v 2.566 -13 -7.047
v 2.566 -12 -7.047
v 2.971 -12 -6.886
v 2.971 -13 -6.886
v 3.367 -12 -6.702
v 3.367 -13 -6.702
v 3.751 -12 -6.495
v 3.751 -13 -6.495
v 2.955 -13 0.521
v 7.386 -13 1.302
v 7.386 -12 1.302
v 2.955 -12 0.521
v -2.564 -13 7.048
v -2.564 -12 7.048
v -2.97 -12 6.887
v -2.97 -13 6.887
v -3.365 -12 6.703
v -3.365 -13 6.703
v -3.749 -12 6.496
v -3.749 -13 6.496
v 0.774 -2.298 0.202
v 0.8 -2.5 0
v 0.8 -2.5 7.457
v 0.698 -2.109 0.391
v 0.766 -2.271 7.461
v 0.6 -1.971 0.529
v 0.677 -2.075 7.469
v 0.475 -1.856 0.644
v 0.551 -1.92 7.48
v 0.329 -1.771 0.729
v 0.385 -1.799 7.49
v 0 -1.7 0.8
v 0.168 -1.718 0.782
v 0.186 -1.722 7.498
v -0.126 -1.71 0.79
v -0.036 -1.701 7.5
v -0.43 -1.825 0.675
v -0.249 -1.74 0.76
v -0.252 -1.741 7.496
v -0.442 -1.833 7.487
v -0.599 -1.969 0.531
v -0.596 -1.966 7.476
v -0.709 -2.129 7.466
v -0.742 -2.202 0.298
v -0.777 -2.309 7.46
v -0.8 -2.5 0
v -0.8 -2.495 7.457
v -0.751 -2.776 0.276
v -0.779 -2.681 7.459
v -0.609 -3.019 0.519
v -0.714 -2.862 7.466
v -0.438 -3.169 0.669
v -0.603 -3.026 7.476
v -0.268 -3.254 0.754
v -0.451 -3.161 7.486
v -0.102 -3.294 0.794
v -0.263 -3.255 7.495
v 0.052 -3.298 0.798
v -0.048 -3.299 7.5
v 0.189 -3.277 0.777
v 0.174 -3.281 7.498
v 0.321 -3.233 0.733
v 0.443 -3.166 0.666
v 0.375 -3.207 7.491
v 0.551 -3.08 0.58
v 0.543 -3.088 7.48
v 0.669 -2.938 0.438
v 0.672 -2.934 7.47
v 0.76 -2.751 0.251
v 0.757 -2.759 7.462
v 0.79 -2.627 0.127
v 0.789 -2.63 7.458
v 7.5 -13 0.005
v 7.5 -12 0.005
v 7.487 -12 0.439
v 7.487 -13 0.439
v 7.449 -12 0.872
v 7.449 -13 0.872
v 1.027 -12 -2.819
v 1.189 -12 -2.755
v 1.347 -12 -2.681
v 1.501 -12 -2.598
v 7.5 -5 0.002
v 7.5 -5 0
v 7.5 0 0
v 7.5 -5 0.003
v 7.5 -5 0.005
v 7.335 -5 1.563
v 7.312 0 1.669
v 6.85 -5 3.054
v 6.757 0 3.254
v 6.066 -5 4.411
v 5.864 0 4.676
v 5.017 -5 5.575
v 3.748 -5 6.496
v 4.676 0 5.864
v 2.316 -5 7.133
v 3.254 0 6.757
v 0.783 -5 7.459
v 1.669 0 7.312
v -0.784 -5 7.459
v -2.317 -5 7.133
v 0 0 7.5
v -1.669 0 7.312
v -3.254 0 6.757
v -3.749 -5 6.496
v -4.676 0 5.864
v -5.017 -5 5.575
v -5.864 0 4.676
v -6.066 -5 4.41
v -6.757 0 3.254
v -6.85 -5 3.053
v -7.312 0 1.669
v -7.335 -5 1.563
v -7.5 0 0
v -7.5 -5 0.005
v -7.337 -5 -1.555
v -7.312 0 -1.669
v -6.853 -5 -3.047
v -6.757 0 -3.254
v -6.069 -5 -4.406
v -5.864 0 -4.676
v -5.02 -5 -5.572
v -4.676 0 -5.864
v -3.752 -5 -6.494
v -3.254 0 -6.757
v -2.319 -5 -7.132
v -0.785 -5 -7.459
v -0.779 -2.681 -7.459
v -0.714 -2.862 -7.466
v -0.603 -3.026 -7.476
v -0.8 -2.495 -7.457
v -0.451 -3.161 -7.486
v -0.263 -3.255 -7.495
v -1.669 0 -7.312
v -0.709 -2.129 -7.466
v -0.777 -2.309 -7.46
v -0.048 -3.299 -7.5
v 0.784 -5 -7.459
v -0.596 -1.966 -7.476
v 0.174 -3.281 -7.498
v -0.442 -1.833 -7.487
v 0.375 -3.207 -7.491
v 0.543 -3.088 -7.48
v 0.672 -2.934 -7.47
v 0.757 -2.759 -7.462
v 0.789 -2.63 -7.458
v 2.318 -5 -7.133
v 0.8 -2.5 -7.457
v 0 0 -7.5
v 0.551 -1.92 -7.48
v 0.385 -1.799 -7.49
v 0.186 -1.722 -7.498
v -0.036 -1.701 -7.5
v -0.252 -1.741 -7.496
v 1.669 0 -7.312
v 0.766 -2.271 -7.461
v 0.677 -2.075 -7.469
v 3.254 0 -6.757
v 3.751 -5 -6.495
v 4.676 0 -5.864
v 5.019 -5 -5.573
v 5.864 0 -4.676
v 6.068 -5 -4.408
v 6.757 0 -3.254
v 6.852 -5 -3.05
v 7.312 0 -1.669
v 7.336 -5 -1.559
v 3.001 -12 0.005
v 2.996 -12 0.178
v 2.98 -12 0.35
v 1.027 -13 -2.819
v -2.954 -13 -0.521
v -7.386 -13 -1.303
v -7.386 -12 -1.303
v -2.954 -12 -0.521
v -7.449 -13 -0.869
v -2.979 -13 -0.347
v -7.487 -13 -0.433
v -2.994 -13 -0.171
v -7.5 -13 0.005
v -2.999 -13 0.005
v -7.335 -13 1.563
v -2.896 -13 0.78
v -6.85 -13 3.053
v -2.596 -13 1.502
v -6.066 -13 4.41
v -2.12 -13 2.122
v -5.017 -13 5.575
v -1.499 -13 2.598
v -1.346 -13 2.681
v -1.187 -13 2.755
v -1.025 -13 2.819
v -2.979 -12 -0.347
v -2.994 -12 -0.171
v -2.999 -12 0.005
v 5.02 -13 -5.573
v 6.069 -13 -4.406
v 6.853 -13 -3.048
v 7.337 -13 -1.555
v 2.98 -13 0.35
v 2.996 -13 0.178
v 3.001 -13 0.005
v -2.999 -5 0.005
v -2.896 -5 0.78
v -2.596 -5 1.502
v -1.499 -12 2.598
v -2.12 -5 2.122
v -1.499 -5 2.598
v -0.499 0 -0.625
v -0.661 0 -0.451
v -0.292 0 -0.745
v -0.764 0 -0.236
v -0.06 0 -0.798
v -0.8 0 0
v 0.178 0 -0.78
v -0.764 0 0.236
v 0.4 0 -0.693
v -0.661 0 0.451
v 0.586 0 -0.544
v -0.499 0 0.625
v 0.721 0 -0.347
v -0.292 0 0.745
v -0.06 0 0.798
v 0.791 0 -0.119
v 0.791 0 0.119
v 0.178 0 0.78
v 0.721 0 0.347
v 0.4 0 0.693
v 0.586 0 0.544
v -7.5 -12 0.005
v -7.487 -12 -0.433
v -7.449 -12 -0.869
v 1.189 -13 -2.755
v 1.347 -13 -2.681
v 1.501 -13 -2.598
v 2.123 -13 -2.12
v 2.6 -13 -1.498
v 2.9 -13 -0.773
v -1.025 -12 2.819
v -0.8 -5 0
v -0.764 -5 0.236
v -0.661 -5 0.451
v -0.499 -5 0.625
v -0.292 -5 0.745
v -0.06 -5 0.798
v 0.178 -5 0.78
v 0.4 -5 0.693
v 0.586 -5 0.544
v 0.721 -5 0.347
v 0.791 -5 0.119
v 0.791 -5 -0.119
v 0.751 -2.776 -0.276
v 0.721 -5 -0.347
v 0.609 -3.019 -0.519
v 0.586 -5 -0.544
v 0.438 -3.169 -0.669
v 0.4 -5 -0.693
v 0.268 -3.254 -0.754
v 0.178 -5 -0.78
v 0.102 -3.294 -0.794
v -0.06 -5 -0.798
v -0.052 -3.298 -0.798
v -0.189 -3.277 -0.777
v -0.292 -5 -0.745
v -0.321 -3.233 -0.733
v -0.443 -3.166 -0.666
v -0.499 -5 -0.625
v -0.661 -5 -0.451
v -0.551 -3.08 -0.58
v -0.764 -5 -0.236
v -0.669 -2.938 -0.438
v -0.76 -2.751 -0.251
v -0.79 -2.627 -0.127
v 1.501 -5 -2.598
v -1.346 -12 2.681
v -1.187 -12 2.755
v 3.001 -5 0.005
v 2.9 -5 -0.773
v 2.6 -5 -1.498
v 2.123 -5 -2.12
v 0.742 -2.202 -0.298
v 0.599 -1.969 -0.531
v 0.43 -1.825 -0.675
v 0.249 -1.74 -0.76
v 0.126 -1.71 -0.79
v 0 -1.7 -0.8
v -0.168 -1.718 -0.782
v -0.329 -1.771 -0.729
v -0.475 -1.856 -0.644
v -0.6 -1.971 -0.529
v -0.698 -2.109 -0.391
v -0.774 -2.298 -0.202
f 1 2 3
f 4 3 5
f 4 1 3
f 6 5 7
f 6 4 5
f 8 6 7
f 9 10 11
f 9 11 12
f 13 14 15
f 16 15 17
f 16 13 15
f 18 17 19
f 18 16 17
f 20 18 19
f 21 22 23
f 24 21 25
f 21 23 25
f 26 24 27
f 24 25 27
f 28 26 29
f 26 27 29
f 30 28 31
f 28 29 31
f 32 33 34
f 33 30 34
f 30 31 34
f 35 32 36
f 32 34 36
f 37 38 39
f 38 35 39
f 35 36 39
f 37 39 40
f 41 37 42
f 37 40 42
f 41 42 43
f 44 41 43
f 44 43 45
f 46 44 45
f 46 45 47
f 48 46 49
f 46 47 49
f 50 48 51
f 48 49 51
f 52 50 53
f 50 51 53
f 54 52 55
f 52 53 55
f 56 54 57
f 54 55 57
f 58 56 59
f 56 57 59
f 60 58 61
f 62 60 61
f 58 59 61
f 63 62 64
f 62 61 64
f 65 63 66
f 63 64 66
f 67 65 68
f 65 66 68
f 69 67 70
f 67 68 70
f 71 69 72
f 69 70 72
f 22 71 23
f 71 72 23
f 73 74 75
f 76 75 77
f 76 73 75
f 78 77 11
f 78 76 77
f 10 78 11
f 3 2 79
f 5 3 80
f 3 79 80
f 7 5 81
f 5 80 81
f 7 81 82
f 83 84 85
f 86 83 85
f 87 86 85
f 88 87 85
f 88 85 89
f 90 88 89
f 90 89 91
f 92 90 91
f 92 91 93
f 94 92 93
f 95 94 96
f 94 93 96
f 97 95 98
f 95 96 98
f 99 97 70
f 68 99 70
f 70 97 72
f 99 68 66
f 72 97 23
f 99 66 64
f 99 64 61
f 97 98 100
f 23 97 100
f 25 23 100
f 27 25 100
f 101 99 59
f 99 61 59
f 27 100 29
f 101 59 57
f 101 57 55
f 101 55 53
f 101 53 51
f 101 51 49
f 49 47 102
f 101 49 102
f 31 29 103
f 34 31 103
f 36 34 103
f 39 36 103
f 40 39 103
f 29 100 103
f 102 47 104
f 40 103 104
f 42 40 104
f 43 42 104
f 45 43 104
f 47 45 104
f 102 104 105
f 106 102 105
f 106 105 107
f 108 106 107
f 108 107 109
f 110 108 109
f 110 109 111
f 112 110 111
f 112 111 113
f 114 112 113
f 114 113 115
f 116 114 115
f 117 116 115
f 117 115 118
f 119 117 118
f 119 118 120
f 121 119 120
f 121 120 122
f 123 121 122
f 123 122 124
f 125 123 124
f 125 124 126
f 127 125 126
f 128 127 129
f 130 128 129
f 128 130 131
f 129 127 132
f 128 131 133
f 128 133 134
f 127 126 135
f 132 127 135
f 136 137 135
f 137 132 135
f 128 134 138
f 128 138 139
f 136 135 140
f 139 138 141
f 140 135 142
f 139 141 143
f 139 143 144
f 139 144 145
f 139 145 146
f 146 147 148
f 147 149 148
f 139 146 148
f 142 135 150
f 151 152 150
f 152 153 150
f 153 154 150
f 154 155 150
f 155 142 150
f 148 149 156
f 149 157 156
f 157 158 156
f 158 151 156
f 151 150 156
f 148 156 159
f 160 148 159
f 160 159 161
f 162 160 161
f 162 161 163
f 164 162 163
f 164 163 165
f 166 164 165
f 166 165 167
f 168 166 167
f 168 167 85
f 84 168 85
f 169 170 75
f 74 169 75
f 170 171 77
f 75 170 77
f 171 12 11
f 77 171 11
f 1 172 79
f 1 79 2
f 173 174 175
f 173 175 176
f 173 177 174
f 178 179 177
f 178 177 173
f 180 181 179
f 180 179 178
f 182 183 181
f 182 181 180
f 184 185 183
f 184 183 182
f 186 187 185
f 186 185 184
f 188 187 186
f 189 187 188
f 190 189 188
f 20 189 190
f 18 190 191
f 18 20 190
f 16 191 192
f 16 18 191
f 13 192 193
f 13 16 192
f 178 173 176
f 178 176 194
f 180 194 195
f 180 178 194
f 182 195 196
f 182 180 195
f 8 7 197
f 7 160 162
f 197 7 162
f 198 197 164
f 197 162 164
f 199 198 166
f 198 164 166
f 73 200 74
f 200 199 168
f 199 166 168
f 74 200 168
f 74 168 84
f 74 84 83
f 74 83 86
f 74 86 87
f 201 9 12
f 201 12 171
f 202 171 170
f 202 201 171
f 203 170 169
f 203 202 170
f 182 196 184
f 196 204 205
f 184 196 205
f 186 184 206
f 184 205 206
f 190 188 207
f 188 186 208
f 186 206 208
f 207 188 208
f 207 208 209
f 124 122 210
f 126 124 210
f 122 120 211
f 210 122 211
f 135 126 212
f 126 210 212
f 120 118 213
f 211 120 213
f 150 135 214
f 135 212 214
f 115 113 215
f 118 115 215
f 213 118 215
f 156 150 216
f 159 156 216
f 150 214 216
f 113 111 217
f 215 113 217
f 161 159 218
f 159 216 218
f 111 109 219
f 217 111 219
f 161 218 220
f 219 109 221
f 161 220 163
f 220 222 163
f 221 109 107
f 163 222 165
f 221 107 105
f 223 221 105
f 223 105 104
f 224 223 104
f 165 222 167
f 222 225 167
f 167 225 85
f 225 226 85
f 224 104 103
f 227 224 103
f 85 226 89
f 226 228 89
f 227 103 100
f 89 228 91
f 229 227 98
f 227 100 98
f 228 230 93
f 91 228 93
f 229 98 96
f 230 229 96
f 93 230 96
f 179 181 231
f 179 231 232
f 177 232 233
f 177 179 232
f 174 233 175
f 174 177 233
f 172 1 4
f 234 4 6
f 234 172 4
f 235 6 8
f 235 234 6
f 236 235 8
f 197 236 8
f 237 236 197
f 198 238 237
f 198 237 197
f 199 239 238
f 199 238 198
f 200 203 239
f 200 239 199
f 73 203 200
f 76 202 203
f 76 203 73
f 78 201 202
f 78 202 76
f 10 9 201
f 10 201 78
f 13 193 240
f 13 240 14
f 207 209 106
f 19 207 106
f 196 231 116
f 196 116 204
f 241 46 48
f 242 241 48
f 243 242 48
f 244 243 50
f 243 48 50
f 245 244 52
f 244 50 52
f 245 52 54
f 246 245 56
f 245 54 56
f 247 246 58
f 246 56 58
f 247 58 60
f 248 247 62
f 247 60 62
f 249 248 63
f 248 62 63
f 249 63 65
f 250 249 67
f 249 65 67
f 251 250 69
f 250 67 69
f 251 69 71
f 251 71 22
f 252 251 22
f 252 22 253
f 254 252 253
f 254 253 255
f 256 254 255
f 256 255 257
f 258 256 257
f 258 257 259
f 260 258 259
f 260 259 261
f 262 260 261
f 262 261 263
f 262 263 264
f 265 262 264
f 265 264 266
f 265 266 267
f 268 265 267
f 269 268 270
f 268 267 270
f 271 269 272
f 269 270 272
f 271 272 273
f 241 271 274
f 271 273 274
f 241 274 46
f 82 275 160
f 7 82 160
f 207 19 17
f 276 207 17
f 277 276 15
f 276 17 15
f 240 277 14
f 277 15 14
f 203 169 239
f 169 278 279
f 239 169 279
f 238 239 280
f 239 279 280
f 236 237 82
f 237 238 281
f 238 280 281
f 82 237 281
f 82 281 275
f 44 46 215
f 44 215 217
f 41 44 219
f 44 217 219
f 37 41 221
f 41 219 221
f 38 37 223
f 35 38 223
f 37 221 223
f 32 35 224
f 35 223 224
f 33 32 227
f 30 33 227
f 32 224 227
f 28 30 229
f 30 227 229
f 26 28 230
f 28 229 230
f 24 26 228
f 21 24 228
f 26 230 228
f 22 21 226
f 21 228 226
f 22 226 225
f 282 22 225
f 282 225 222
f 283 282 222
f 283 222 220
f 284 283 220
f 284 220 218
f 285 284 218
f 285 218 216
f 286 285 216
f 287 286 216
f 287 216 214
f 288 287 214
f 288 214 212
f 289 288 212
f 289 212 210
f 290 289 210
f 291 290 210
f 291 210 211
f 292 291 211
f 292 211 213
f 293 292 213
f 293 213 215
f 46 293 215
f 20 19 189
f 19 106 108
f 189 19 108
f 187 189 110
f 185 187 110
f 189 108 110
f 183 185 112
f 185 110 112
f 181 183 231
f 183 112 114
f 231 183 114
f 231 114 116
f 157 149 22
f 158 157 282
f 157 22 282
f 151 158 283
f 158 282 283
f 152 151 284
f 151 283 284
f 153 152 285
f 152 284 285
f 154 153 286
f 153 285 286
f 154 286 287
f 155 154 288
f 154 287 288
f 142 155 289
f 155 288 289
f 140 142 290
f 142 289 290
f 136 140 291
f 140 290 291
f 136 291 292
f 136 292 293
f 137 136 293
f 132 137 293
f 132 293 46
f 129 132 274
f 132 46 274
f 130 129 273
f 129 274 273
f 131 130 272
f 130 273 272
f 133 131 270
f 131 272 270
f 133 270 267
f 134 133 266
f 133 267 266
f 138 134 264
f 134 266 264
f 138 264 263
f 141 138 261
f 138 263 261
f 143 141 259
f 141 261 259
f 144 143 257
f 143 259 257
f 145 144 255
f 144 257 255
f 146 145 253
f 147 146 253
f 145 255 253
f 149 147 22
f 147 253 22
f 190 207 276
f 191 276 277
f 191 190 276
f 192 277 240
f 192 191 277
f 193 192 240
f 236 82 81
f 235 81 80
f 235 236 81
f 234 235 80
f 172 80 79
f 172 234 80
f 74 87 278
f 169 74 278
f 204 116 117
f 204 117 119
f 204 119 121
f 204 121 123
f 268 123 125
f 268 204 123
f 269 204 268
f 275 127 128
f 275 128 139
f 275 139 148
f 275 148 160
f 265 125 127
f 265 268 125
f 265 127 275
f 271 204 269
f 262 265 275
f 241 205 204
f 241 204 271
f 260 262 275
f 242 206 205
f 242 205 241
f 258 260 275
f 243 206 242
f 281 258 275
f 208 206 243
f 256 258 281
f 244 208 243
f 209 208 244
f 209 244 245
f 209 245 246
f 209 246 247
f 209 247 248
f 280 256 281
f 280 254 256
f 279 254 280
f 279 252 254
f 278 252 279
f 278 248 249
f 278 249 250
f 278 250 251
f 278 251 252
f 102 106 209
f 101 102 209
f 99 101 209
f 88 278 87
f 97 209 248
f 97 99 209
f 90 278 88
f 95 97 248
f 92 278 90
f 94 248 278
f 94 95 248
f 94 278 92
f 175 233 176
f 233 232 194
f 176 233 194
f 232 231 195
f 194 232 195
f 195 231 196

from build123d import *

# Parameters (mm, degrees)
F0_R     = 7.5
F1_DEPTH = 5
F3_DEPTH = 8
F4_R     = 0.8
F5_DEPTH = 13.001
F6_R     = 0.8
F7_DEPTH = 12.5
F9_DEPTH = 1


with BuildPart() as f1:
    # F0 (on Front) → F1 (new body)
    with BuildSketch(Plane.XZ):
        Circle(F0_R)
    extrude(amount=F1_DEPTH)

    # F2 (on face) → F3 (join)
    with BuildSketch(Plane.XZ.offset(5)):
        with BuildLine():
            ThreePointArc((-2.9991336175, 0.0047529666), (-2.5960245368, 1.5020576249), (-1.4991373826, 2.5980762114))
            Line((-1.4991373826, 2.5980762114), (-3.7493530184, 6.4955640204))
            ThreePointArc((-3.7493530184, 6.4955640204), (-6.4938150879, 3.7523813244), (-7.499998494, 0.0047529666))
            Line((-7.499998494, 0.0047529666), (-2.9991336175, 0.0047529666))
        make_face()
        with BuildLine():
            ThreePointArc((3.0008588523, 0.0047529666), (2.6001262556, -1.4979414338), (1.5008626174, -2.5980762114))
            Line((1.5008626174, -2.5980762114), (3.7506469444, -6.4948169719))
            ThreePointArc((3.7506469444, -6.4948169719), (6.4965650956, -3.7476181714), (7.499998494, 0.0047529666))
            Line((7.499998494, 0.0047529666), (3.0008588523, 0.0047529666))
        make_face()
    extrude(amount=F3_DEPTH)

    # F4 (on face) → F5 (cut, through all)
    with BuildSketch(Plane(origin=(0, 0, 0), x_dir=(-1, 0, 0), z_dir=(0, 1, 0))):
        Circle(F4_R)
    extrude(amount=-F5_DEPTH, mode=Mode.SUBTRACT)

    # F6 (on Top) → F7 (cut, symmetric)
    with BuildSketch(Plane.XY):
        with Locations((0, -2.5)):
            Circle(F6_R)
    extrude(amount=F7_DEPTH, both=True, mode=Mode.SUBTRACT)

    # F8 (on face) → F9 (join)
    with BuildSketch(Plane.XZ.offset(13)):
        with BuildLine():
            ThreePointArc((2.9552858764, 0.520944533), (2.5989388287, -1.5), (1.0269230474, -2.8190778624))
            Line((1.0269230474, -2.8190778624), (2.5659127703, -7.0474173748))
            ThreePointArc((2.5659127703, -7.0474173748), (6.4953557229, -3.7497138602), (7.3860841572, 1.302213816))
            Line((7.3860841572, 1.302213816), (2.9552858764, 0.520944533))
        make_face()
        with BuildLine():
            Line((-7.386032135, -1.3025088485), (-2.9535606416, -0.520944533))
            ThreePointArc((-2.9535606416, -0.520944533), (-2.597213594, 1.5), (-1.0251978126, 2.8190778624))
            Line((-1.0251978126, 2.8190778624), (-2.5643893496, 7.0479718546))
            ThreePointArc((-2.5643893496, 7.0479718546), (-6.4950253213, 3.7502861326), (-7.386032135, -1.3025088485))
        make_face()
    extrude(amount=-F9_DEPTH)


solid = f1.part
